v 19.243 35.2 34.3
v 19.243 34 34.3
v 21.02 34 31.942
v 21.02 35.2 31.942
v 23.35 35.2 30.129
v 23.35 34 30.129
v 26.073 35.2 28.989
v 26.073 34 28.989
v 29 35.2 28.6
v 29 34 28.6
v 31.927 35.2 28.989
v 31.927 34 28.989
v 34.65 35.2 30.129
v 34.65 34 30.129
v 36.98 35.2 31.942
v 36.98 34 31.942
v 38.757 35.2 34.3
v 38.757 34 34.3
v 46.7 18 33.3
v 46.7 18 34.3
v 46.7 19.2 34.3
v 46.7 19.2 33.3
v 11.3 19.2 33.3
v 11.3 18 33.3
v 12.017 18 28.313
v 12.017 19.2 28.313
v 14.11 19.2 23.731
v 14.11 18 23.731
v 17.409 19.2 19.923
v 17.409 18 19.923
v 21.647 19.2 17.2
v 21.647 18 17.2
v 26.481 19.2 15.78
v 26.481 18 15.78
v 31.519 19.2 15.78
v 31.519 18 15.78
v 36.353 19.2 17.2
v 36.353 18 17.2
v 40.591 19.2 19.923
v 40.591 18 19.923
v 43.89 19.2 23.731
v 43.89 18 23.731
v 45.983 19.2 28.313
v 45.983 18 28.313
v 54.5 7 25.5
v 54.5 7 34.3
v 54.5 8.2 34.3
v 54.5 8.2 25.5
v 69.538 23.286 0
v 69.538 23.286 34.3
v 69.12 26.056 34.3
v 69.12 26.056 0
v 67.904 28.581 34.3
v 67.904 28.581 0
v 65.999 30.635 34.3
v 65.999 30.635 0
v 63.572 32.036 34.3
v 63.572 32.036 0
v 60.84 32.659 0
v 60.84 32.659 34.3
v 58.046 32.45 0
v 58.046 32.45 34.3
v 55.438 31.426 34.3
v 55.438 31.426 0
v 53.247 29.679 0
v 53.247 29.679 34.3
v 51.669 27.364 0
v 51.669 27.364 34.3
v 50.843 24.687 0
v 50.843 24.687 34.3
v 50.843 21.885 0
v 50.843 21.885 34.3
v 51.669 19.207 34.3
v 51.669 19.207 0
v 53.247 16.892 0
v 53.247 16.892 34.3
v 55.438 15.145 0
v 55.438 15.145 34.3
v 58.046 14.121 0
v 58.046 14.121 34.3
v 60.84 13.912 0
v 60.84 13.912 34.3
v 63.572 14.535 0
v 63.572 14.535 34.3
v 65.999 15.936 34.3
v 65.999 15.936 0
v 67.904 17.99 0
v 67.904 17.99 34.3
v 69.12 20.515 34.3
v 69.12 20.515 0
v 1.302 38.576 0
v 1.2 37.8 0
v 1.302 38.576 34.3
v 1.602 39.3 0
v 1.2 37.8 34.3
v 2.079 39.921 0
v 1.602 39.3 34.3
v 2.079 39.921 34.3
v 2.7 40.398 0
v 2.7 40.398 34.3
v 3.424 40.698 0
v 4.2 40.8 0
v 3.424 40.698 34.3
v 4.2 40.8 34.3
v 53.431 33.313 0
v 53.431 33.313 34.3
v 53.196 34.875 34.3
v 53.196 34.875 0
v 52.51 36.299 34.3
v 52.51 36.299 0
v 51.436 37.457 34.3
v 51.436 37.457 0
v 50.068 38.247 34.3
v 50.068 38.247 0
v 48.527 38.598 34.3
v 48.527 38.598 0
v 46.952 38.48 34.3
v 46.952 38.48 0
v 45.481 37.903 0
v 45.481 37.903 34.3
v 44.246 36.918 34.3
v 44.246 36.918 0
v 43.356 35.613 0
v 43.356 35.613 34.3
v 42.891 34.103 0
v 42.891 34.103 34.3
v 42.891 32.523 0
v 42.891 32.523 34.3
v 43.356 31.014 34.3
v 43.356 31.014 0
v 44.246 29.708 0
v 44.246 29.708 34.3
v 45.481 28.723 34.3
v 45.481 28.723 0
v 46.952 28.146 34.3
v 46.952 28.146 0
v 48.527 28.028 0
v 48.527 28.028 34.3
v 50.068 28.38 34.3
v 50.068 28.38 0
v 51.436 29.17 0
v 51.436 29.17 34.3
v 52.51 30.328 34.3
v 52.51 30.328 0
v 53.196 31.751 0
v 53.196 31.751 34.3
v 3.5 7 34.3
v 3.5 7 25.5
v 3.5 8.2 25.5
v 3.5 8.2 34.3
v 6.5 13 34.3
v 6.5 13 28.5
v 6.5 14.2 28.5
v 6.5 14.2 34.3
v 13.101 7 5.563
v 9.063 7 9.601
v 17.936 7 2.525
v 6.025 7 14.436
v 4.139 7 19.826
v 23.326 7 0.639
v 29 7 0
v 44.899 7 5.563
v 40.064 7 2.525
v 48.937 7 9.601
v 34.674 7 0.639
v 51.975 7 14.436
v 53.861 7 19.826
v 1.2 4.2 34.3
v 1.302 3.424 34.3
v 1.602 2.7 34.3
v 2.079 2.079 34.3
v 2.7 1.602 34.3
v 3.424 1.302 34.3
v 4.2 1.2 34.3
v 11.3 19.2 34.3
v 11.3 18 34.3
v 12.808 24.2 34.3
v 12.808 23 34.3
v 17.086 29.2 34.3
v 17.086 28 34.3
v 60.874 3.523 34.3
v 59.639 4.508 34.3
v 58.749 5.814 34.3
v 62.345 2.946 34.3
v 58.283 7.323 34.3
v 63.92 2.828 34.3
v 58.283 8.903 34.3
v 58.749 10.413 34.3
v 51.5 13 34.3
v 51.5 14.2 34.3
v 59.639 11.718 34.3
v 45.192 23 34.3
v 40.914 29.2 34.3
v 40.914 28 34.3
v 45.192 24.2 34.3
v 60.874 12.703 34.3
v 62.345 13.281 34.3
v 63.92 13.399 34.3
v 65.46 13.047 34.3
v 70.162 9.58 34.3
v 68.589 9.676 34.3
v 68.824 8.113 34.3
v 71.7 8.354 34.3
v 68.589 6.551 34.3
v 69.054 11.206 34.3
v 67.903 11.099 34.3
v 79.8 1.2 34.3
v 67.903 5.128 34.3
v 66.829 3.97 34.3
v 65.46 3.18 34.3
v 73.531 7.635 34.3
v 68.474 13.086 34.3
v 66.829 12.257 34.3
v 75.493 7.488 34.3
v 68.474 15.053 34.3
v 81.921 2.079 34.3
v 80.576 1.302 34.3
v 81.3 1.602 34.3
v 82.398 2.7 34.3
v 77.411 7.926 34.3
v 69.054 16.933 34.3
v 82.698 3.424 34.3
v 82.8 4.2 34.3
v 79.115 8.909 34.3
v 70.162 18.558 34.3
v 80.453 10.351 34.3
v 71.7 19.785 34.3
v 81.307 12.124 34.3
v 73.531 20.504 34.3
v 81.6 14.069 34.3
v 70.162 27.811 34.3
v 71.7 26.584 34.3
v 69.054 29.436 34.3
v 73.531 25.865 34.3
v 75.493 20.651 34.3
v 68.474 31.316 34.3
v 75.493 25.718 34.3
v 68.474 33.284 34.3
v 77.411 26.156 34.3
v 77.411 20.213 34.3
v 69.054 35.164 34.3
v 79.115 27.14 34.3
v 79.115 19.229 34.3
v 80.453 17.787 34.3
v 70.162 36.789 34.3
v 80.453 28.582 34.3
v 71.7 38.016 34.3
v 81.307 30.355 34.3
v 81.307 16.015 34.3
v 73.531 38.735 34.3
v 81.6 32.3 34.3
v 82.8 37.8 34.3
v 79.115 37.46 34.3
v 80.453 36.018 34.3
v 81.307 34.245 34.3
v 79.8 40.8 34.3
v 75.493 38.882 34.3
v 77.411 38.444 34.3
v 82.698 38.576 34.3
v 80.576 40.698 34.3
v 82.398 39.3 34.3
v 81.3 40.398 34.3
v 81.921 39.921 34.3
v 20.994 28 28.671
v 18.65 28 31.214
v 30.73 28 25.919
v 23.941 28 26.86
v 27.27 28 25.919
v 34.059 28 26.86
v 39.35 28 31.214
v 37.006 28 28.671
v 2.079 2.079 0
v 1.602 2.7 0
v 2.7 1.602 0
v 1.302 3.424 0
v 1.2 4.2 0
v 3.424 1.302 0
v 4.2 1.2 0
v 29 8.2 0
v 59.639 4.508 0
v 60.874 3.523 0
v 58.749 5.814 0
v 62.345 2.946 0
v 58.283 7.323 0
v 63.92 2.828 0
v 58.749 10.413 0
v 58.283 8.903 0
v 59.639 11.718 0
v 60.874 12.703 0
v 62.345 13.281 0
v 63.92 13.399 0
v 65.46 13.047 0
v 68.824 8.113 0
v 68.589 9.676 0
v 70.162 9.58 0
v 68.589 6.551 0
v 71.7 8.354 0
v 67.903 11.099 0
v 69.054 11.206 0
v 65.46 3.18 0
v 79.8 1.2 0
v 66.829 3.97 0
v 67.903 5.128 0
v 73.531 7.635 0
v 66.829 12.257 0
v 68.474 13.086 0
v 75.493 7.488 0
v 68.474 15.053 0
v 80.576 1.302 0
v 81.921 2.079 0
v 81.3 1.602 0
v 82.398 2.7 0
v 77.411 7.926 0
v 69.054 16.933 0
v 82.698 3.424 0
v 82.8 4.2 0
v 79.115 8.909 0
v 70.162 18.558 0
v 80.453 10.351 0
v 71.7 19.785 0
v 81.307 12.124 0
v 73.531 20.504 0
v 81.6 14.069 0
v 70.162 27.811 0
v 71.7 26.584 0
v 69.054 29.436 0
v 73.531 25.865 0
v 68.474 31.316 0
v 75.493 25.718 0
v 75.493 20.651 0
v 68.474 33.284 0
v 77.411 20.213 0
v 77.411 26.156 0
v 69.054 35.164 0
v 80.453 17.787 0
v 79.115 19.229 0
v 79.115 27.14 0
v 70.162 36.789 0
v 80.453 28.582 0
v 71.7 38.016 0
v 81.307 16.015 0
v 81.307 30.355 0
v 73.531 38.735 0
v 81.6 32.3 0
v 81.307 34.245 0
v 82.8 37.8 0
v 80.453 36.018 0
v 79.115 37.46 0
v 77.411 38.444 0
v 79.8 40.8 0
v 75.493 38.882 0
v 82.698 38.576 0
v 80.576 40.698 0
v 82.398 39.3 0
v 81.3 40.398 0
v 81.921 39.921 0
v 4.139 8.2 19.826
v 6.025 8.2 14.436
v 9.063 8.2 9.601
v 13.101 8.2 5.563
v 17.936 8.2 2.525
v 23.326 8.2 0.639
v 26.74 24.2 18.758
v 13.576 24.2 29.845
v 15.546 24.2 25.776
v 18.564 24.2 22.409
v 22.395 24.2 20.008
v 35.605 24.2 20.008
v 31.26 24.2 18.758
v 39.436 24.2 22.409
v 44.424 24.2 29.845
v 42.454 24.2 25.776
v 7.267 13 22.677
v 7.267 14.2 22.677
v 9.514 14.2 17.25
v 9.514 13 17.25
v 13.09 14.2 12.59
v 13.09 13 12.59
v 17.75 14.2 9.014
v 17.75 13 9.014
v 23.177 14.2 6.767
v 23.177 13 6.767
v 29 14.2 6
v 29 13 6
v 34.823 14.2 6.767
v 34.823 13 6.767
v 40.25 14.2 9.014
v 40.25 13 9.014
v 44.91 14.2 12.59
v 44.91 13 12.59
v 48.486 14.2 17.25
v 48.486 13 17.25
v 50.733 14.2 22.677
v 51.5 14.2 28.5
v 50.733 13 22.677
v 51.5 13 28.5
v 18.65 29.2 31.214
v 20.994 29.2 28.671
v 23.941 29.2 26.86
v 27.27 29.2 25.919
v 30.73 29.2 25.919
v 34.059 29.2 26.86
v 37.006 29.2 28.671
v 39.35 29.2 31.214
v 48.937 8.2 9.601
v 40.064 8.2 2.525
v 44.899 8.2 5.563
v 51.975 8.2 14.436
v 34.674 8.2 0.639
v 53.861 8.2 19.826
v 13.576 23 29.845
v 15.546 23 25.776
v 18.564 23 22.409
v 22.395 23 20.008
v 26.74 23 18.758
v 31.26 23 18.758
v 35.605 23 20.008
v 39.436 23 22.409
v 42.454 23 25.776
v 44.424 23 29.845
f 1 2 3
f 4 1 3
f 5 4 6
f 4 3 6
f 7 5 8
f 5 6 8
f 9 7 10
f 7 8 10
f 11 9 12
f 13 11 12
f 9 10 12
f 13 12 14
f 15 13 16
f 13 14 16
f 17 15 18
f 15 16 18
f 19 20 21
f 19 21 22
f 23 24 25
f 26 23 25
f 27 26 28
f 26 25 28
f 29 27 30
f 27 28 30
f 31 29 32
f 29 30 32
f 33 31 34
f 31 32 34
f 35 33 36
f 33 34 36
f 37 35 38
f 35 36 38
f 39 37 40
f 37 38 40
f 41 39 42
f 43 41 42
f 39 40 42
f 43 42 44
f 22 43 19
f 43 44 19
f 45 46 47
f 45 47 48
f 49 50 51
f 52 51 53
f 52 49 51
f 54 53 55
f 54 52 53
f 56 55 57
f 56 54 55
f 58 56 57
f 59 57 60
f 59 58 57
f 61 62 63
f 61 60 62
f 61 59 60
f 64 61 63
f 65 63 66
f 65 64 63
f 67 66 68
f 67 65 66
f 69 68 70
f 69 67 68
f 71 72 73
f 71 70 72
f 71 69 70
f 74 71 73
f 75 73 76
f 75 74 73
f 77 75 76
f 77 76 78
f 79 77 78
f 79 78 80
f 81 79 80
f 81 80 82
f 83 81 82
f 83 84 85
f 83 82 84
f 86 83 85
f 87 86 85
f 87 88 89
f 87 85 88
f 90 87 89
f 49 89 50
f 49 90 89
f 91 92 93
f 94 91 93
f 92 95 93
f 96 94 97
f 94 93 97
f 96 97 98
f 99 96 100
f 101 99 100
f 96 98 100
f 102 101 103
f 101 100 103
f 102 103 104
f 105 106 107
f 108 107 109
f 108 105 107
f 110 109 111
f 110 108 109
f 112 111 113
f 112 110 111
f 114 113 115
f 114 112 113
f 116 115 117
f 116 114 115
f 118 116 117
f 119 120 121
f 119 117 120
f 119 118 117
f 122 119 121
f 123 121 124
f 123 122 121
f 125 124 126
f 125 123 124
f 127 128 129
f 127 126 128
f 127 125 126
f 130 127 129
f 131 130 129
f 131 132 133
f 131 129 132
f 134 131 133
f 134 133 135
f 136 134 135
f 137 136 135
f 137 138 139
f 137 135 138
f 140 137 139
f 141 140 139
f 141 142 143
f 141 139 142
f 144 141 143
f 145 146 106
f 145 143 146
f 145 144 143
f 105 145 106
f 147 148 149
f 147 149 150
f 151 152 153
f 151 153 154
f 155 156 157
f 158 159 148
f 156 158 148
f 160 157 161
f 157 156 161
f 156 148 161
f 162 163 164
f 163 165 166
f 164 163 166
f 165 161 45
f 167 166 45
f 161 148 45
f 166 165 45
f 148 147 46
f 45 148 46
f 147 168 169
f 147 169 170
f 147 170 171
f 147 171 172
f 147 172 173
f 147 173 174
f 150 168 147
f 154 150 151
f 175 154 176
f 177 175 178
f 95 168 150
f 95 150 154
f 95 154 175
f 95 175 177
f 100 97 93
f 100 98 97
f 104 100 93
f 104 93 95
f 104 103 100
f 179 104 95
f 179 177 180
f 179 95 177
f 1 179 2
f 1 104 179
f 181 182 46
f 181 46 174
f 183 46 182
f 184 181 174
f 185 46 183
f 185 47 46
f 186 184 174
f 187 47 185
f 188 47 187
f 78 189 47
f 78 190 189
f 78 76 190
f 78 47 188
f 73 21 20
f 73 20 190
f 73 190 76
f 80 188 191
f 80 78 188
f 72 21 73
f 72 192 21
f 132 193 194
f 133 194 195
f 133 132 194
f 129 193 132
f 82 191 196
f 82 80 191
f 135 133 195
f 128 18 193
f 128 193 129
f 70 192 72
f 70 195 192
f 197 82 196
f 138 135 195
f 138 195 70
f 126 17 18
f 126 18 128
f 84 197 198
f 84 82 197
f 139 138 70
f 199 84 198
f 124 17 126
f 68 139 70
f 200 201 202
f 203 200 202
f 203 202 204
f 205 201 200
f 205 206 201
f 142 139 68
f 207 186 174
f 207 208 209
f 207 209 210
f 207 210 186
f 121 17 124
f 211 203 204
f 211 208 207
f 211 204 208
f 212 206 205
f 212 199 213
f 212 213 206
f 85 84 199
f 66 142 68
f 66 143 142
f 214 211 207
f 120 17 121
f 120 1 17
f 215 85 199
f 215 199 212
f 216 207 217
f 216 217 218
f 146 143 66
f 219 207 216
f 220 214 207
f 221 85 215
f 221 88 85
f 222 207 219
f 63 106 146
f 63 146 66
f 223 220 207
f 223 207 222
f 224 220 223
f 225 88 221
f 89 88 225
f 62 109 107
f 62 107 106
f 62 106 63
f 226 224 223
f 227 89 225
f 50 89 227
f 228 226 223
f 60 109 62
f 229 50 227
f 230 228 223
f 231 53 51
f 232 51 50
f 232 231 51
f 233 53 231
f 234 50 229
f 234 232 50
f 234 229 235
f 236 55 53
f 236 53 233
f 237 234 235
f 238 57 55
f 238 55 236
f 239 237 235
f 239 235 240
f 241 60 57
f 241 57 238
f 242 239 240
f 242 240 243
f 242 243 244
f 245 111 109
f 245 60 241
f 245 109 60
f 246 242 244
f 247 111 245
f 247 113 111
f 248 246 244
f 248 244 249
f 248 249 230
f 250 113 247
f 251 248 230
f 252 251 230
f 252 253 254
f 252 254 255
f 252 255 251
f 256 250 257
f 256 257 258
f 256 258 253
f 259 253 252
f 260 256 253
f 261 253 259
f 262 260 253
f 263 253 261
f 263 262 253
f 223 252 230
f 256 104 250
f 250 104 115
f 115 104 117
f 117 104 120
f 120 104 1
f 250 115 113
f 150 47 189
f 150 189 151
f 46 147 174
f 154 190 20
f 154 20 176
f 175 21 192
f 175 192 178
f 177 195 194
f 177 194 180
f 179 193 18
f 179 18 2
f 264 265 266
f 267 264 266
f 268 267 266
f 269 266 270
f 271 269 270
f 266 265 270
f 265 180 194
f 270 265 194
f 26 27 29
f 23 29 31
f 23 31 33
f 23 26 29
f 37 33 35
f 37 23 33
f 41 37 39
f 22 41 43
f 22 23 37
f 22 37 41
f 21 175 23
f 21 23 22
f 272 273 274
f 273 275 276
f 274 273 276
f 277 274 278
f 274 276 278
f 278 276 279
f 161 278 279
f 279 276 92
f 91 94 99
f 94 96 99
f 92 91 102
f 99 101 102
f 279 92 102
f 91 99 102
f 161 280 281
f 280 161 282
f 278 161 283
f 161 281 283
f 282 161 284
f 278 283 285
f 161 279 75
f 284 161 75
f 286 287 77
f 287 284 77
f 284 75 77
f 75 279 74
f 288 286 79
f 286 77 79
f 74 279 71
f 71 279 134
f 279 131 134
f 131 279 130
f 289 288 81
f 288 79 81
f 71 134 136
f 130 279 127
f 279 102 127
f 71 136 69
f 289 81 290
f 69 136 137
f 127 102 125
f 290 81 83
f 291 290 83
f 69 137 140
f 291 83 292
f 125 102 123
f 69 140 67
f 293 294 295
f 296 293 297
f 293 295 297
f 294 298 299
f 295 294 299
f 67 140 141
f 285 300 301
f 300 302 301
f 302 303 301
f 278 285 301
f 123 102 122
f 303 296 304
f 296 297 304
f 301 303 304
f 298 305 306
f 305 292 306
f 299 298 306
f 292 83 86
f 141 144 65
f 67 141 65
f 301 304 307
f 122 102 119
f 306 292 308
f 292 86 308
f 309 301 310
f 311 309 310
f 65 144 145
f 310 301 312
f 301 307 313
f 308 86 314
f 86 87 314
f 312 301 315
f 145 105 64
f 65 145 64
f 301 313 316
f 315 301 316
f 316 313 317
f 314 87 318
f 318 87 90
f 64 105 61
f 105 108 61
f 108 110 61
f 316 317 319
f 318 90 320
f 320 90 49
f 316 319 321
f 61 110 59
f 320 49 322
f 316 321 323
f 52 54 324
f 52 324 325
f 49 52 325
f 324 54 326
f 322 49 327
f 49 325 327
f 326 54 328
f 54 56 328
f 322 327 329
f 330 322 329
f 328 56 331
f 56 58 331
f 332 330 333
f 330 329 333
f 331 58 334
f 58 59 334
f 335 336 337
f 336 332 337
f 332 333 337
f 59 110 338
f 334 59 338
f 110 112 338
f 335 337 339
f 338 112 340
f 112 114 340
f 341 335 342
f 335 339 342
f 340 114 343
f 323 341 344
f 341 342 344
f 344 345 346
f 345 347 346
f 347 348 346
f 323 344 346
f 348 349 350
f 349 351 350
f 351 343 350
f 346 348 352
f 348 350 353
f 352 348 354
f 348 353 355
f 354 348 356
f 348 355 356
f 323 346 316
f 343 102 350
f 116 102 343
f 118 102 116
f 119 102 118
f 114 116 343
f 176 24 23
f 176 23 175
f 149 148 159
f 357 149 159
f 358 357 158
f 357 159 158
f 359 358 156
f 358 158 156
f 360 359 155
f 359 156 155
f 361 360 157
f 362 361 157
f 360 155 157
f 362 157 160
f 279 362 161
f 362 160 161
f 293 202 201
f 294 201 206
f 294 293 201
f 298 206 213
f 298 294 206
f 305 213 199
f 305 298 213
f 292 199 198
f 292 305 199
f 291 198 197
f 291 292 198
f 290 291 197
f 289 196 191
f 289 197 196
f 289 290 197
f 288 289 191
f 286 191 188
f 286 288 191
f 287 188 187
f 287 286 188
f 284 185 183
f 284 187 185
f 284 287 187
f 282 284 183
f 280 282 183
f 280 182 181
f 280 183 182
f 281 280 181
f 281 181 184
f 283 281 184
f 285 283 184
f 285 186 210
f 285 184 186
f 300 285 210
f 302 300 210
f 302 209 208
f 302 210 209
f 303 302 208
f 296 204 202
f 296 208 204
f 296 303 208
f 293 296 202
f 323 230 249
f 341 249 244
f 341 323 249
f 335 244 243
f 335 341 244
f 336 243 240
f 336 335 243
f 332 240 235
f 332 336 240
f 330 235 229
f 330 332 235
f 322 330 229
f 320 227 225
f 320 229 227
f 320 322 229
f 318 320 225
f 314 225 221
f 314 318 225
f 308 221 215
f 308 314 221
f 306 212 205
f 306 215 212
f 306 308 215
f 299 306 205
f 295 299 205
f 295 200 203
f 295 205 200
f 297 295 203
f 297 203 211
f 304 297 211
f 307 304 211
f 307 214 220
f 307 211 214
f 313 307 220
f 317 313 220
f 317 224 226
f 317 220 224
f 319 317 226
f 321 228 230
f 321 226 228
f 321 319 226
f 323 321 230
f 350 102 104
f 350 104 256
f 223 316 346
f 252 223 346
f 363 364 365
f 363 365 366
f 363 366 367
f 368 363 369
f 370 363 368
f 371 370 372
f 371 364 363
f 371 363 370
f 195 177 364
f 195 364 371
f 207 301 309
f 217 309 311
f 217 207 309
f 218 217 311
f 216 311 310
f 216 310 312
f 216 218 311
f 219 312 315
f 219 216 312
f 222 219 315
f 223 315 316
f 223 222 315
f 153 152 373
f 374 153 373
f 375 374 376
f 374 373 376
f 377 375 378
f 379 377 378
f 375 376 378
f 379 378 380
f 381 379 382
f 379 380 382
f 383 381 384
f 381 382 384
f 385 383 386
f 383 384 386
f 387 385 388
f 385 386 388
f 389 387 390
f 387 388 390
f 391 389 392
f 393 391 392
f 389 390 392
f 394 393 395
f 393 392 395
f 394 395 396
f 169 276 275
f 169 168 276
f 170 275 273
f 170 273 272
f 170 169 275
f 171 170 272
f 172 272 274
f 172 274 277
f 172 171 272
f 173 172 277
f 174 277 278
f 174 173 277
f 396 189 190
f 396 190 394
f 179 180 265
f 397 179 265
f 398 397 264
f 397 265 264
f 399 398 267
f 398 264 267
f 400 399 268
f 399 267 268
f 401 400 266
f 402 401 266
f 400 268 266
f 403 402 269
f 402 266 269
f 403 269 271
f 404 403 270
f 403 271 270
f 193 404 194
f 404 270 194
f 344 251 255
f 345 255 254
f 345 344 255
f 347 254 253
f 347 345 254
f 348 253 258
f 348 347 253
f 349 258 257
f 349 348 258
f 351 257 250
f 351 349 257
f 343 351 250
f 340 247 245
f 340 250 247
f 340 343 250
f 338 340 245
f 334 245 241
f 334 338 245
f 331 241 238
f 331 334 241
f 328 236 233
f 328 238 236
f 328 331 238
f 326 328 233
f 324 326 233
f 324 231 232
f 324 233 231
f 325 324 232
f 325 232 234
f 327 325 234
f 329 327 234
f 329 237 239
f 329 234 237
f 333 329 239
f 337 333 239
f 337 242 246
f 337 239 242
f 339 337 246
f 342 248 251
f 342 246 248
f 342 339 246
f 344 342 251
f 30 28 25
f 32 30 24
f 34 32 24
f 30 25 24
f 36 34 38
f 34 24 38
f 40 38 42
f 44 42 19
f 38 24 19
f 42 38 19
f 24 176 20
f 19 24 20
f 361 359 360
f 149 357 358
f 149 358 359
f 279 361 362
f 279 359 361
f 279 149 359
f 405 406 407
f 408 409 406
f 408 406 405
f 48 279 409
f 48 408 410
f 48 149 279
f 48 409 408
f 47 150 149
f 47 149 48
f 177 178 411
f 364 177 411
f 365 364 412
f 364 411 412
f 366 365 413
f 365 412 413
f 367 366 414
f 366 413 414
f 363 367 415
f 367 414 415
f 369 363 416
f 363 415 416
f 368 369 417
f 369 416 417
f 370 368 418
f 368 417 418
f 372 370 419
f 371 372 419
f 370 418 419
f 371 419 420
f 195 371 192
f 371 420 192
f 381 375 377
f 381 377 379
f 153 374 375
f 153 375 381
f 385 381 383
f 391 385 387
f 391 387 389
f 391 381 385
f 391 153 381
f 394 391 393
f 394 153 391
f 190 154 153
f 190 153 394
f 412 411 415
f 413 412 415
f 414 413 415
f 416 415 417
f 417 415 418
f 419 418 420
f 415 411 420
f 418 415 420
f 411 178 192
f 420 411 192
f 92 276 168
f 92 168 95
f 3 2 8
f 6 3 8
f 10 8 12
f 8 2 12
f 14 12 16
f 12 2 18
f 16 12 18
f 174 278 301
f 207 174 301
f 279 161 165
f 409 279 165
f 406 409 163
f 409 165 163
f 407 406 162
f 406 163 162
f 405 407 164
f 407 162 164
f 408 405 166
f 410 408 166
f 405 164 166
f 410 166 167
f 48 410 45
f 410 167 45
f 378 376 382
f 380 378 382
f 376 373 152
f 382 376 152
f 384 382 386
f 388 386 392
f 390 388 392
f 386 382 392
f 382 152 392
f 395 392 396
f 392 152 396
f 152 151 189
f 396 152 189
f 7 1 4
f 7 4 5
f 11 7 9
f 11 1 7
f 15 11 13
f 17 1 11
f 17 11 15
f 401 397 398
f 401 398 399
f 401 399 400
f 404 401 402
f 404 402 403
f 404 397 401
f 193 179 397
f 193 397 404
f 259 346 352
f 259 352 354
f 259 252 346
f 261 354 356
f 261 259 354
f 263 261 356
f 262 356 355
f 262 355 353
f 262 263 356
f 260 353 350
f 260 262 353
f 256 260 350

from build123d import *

# Parameters (mm, degrees)
SKETCH084_W     = 81.6
SKETCH084_H     = 39.6
PAD023_DEPTH    = 34.3
FILLET002_R     = 3
POCKET007_DEPTH = 1.2
POCKET019_DEPTH = 1.2
POCKET016_DEPTH = 1.2
POCKET021_DEPTH = 1.2
POCKET020_DEPTH = 1.2
POCKET018_DEPTH = 1.2
SKETCH094_R     = 6.6
SKETCH094_R_2   = 9.4
SKETCH094_R_3   = 5.3
POCKET017_DEPTH = 34.301


with BuildPart() as part:
    # Sketch084 → Pad023 (new body)
    with BuildSketch(Plane.XY):
        with Locations((42, 21)):
            Rectangle(SKETCH084_W, SKETCH084_H)
    extrude(amount=PAD023_DEPTH)

    # Fillet002
    fillet002_edges = [part.edges().sort_by_distance(p)[0] for p in [
        (82.8, 1.2, 17.15),
        (1.2, 1.2, 17.15),
        (1.2, 40.8, 17.15),
        (82.8, 40.8, 17.15),
    ]]
    fillet(fillet002_edges, radius=FILLET002_R)

    # Sketch088 → Pocket007 (cut)
    with BuildSketch(Plane(origin=(2, 7, 0), x_dir=(1, 0, 0), z_dir=(0, -1, 0))):
        with BuildLine():
            ThreePointArc((1.5, 25.5), (27, 0), (52.5, 25.5))
            Line((52.5, 61.679322), (52.5, 25.5))
            Line((1.5, 61.679322), (52.5, 61.679322))
            Line((1.5, 25.5), (1.5, 61.679322))
        make_face()
    extrude(amount=-POCKET007_DEPTH, mode=Mode.SUBTRACT)

    # Sketch089 → Pocket019 (cut)
    with BuildSketch(Plane(origin=(2, 13, 0), x_dir=(1, 0, 0), z_dir=(0, -1, 0))):
        with BuildLine():
            ThreePointArc((4.5, 28.5), (26.999982, 6), (49.5, 28.499964))
            Line((49.5, 51.5), (49.5, 28.499964))
            Line((4.5, 51.5), (49.5, 51.5))
            Line((4.5, 28.5), (4.5, 51.5))
        make_face()
    extrude(amount=-POCKET019_DEPTH, mode=Mode.SUBTRACT)

    # Sketch090 → Pocket016 (cut)
    with BuildSketch(Plane(origin=(2, 18, 0), x_dir=(1, 0, 0), z_dir=(0, -1, 0))):
        with BuildLine():
            ThreePointArc((9.3, 33.3), (26.999984, 15.6), (44.7, 33.299969))
            Line((44.7, 56.3), (44.7, 33.299969))
            Line((9.3, 56.3), (44.7, 56.3))
            Line((9.3, 33.3), (9.3, 56.3))
        make_face()
    extrude(amount=-POCKET016_DEPTH, mode=Mode.SUBTRACT)

    # Sketch091 → Pocket021 (cut)
    with BuildSketch(Plane(origin=(2, 23, 0), x_dir=(1, 0, 0), z_dir=(0, -1, 0))):
        with BuildLine():
            ThreePointArc((10.8, 34.8), (26.999981, 18.6), (43.2, 34.799961))
            Line((43.2, 57.8), (43.2, 34.799961))
            Line((10.8, 57.8), (43.2, 57.8))
            Line((10.8, 34.8), (10.8, 57.8))
        make_face()
    extrude(amount=-POCKET021_DEPTH, mode=Mode.SUBTRACT)

    # Sketch092 → Pocket020 (cut)
    with BuildSketch(Plane(origin=(2, 28, 0), x_dir=(1, 0, 0), z_dir=(0, -1, 0))):
        with BuildLine():
            ThreePointArc((14.4, 38.4), (26.999981, 25.8), (39.6, 38.399963))
            Line((39.6, 61.4), (39.6, 38.399963))
            Line((14.4, 61.4), (39.6, 61.4))
            Line((14.4, 38.4), (14.4, 61.4))
        make_face()
    extrude(amount=-POCKET020_DEPTH, mode=Mode.SUBTRACT)

    # Sketch093 → Pocket018 (cut)
    with BuildSketch(Plane(origin=(2, 34, 0), x_dir=(1, 0, 0), z_dir=(0, -1, 0))):
        with BuildLine():
            ThreePointArc((15.8, 39.8), (26.999979, 28.6), (38.2, 39.799958))
            Line((38.2, 62.8), (38.2, 39.799958))
            Line((15.8, 62.8), (38.2, 62.8))
            Line((15.8, 39.8), (15.8, 62.8))
        make_face()
    extrude(amount=-POCKET018_DEPTH, mode=Mode.SUBTRACT)

    # Sketch094 → Pocket017 (cut, through all)
    with BuildSketch(Plane.XY):
        with Locations((75, 32.3)):
            Circle(SKETCH094_R)
        with Locations((75, 14.069301)):
            Circle(SKETCH094_R)
        with Locations((60.137726, 23.285616)):
            Circle(SKETCH094_R_2)
        with Locations((63.524133, 8.113385)):
            Circle(SKETCH094_R_3)
        with Locations((48.131386, 33.31328)):
            Circle(SKETCH094_R_3)
    extrude(amount=POCKET017_DEPTH, mode=Mode.SUBTRACT)


solid = part.part
